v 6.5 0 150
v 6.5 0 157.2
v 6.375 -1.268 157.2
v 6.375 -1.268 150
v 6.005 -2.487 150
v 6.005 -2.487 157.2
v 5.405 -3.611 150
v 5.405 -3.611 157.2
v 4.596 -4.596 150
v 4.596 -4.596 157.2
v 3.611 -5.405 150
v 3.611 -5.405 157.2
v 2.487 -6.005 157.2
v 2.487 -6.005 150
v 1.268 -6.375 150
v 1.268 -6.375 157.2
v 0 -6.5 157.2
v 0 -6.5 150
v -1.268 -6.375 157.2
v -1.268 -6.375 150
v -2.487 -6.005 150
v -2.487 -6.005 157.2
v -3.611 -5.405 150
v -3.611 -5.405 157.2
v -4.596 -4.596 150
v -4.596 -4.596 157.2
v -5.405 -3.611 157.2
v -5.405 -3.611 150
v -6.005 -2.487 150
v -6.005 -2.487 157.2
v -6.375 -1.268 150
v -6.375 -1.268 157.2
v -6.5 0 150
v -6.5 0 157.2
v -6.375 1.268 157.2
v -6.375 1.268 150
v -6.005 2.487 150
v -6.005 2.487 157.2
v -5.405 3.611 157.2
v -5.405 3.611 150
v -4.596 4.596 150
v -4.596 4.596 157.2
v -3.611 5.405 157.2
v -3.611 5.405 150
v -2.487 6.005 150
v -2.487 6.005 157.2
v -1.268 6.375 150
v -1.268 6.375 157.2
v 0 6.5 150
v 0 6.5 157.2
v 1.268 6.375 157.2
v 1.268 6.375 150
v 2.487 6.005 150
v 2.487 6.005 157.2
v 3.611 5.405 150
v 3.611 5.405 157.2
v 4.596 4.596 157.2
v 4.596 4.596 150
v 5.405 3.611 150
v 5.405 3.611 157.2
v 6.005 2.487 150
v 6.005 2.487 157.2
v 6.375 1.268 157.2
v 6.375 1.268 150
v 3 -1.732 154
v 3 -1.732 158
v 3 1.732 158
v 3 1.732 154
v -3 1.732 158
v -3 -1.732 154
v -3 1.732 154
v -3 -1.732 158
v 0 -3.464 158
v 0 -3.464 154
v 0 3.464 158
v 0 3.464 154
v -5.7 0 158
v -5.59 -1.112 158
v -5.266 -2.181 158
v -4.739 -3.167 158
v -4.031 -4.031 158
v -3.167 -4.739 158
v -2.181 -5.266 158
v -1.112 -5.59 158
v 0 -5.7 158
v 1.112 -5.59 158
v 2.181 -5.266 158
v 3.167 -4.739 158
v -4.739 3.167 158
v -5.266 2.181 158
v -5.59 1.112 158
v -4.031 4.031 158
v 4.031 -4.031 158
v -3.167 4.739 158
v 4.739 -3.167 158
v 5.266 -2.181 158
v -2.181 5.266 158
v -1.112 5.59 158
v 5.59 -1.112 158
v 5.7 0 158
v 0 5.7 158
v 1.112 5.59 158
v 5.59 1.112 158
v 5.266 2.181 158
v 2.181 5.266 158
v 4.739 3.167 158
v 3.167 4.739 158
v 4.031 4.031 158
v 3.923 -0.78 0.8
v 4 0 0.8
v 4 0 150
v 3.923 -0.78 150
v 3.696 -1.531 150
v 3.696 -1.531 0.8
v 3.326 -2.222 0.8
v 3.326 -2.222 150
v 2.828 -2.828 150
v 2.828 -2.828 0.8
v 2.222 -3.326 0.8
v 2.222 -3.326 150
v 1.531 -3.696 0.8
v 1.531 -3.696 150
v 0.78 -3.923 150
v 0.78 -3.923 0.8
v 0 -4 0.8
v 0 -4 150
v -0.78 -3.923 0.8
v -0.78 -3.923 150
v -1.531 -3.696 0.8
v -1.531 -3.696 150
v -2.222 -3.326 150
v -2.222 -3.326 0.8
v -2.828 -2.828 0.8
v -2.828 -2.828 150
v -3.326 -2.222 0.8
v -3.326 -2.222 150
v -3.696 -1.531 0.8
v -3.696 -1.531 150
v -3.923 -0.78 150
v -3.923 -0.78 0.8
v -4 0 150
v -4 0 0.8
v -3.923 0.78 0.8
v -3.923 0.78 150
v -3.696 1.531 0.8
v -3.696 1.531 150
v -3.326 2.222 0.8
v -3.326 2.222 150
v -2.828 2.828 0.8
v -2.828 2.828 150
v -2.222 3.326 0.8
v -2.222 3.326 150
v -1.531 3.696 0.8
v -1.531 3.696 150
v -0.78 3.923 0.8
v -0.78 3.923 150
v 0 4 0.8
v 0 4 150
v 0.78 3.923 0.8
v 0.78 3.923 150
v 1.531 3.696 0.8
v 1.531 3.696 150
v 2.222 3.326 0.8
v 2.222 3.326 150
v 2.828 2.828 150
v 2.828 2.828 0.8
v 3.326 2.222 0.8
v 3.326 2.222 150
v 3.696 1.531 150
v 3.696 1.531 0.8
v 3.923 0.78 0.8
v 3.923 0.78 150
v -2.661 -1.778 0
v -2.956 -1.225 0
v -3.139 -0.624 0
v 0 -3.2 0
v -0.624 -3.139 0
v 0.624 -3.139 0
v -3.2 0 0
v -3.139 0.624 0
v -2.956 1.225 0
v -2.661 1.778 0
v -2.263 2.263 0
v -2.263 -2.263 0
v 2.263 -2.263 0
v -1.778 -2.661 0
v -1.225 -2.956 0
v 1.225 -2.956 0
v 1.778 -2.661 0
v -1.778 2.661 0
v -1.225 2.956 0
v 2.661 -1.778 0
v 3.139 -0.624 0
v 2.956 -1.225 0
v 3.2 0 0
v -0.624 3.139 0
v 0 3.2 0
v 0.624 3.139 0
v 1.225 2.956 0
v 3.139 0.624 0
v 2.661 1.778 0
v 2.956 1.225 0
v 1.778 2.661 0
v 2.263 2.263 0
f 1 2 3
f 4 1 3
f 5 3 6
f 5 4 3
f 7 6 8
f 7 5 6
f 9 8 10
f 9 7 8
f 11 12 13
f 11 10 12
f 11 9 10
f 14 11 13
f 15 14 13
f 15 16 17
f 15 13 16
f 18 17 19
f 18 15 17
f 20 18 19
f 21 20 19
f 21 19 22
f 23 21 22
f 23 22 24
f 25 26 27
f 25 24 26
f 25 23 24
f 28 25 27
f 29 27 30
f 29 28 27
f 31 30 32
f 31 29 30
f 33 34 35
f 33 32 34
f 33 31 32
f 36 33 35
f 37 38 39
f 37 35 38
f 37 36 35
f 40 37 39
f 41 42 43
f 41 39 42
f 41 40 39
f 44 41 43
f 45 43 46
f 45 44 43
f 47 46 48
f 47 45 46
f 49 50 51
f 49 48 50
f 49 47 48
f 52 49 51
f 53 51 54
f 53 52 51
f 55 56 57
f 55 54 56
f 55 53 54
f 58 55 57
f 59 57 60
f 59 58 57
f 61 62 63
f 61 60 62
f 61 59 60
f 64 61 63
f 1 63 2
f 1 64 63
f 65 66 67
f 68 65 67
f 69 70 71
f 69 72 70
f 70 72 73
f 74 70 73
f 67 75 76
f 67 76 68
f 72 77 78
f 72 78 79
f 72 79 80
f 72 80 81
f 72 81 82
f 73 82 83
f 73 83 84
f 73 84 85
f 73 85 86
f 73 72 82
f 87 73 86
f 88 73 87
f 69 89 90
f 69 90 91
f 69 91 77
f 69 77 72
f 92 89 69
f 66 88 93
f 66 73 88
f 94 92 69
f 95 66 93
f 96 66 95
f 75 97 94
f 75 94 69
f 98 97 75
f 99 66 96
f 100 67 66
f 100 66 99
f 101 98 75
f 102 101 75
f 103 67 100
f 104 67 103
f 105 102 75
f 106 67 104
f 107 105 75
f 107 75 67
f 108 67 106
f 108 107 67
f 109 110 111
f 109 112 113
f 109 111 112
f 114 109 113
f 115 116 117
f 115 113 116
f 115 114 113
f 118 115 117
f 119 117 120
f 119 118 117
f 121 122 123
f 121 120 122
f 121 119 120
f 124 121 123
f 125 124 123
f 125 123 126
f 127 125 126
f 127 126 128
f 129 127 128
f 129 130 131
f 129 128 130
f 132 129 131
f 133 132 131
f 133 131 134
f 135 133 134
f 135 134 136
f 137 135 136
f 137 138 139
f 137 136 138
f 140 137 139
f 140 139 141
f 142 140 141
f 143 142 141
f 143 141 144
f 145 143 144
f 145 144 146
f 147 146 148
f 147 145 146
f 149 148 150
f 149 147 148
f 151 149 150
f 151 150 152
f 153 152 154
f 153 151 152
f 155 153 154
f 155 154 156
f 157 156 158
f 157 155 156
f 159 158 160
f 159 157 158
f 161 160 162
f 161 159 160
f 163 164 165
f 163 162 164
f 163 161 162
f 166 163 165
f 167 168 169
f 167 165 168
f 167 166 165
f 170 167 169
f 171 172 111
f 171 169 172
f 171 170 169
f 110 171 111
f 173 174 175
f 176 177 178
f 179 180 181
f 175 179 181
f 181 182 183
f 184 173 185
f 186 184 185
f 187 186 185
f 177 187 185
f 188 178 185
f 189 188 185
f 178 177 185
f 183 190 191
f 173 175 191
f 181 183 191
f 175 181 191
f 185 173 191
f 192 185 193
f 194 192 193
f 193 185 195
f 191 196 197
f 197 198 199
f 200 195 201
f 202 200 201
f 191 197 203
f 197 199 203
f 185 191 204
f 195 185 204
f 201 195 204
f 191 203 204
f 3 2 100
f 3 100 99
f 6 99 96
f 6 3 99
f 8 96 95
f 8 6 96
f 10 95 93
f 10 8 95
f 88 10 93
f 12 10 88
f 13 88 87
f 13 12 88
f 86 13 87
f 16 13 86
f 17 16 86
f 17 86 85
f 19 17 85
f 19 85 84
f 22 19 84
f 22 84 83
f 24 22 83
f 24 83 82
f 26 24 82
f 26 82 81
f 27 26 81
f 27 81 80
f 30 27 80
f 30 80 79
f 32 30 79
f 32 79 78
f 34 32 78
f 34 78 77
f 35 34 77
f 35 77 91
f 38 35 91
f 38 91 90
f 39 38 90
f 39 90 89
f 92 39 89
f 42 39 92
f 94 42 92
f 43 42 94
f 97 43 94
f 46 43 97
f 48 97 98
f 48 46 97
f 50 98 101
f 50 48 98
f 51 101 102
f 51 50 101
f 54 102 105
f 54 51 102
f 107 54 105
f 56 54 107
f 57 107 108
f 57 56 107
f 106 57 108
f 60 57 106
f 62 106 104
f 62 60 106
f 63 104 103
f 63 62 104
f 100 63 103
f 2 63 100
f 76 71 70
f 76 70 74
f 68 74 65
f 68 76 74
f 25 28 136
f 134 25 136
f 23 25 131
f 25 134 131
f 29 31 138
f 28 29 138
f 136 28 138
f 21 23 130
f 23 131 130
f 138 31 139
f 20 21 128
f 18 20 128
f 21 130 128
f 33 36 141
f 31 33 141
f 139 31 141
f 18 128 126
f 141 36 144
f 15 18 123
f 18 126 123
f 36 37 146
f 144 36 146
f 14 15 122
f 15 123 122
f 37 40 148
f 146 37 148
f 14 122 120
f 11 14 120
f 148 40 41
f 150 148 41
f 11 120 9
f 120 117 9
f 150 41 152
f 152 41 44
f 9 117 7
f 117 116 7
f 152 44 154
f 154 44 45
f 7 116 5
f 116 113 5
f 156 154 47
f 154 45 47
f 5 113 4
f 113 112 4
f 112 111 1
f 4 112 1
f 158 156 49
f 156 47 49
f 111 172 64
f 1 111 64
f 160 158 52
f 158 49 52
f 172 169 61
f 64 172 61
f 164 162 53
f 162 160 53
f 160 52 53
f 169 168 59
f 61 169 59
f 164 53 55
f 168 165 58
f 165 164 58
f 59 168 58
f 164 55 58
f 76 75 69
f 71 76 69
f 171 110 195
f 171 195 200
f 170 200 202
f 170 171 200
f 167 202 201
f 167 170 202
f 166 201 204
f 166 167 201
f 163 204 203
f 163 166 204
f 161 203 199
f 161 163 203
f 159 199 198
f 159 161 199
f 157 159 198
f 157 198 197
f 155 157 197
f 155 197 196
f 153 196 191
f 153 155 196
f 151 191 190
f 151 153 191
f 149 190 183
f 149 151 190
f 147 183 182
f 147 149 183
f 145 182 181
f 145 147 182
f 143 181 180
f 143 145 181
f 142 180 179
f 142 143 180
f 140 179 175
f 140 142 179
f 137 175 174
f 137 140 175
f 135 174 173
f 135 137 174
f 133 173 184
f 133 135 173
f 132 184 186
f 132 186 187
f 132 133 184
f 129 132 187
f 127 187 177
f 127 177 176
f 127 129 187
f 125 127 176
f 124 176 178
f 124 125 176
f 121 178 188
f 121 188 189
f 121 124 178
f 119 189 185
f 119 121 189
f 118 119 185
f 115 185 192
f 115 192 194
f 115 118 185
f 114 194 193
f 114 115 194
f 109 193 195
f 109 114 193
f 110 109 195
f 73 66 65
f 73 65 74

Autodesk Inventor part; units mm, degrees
ref_plane "YZ Plane" through (0, 0, 0) normal (1, 0, 0) x (0, 1, 0)
ref_plane "XZ Plane" through (0, 0, 0) normal (0, 1, 0) x (-1, 0, 0)
ref_plane "XY Plane" through (0, 0, 0) normal (0, 0, 1) x (1, 0, 0)
sketch "Sketch1" plane through (0, 0, 0) normal (0, 0, 1) x (1, 0, 0)
  circle A0 centre (0, 0) radius 4
  dimension "Diameter" = 8
extrude "Extrusion1" add sketch "Sketch1" along normal blind 150
sketch "Sketch2" plane through (0, 0, 150) normal (0, 0, 1) x (1, 0, 0)
  circle A0 centre (0, 0) radius 4 projected
  circle A1 centre (0, 0) radius 6.5
  dimension "Head_Diameter" = 13
extrude "Extrusion2" add sketch "Sketch2" along normal blind 8 contours A0 | A1
sketch "Sketch3" plane through (0, 0, 158) normal (0, 0, 1) x (1, 0, 0)
  circle A0 centre (0, 0) radius 6.5 projected
  circle A1 centre (0, 0) radius 3.4641 construction
  line L0 (0, 3.4641) -> (3, 1.7321)
  line L1 (3, -1.7321) -> (3, 1.7321)
  line L2 (0, 3.4641) -> (-3, 1.7321)
  line L3 (-3, -1.7321) -> (-3, 1.7321)
  line L4 (-3, -1.7321) -> (0, -3.4641)
  line L5 (3, -1.7321) -> (0, -3.4641)
  dimension "Hex_Width" = 6
extrude "Extrusion3" cut sketch "Sketch3" against normal blind 4 contours L0 L1 L5 L4 L3 L2
thread "Thread1" size "M8x1.25" class "4g6g" standard "ANSI Metric M Profile" length 28
chamfer "Chamfer1" distance 0.8 angle 45 2 edges at (-6.5, 0, 158) (-4, 0, 0)
equation "\"d9\" = ThreadLength"
equation "\"d12\" = Chamfer"
equation "\"ThreadLength\" = 28"
equation "\"Chamfer\" = 0.8"
properties part number "SCREW, SOC HD, P, 12.9, M8X1.25X150MM" material "Steel, MS"
